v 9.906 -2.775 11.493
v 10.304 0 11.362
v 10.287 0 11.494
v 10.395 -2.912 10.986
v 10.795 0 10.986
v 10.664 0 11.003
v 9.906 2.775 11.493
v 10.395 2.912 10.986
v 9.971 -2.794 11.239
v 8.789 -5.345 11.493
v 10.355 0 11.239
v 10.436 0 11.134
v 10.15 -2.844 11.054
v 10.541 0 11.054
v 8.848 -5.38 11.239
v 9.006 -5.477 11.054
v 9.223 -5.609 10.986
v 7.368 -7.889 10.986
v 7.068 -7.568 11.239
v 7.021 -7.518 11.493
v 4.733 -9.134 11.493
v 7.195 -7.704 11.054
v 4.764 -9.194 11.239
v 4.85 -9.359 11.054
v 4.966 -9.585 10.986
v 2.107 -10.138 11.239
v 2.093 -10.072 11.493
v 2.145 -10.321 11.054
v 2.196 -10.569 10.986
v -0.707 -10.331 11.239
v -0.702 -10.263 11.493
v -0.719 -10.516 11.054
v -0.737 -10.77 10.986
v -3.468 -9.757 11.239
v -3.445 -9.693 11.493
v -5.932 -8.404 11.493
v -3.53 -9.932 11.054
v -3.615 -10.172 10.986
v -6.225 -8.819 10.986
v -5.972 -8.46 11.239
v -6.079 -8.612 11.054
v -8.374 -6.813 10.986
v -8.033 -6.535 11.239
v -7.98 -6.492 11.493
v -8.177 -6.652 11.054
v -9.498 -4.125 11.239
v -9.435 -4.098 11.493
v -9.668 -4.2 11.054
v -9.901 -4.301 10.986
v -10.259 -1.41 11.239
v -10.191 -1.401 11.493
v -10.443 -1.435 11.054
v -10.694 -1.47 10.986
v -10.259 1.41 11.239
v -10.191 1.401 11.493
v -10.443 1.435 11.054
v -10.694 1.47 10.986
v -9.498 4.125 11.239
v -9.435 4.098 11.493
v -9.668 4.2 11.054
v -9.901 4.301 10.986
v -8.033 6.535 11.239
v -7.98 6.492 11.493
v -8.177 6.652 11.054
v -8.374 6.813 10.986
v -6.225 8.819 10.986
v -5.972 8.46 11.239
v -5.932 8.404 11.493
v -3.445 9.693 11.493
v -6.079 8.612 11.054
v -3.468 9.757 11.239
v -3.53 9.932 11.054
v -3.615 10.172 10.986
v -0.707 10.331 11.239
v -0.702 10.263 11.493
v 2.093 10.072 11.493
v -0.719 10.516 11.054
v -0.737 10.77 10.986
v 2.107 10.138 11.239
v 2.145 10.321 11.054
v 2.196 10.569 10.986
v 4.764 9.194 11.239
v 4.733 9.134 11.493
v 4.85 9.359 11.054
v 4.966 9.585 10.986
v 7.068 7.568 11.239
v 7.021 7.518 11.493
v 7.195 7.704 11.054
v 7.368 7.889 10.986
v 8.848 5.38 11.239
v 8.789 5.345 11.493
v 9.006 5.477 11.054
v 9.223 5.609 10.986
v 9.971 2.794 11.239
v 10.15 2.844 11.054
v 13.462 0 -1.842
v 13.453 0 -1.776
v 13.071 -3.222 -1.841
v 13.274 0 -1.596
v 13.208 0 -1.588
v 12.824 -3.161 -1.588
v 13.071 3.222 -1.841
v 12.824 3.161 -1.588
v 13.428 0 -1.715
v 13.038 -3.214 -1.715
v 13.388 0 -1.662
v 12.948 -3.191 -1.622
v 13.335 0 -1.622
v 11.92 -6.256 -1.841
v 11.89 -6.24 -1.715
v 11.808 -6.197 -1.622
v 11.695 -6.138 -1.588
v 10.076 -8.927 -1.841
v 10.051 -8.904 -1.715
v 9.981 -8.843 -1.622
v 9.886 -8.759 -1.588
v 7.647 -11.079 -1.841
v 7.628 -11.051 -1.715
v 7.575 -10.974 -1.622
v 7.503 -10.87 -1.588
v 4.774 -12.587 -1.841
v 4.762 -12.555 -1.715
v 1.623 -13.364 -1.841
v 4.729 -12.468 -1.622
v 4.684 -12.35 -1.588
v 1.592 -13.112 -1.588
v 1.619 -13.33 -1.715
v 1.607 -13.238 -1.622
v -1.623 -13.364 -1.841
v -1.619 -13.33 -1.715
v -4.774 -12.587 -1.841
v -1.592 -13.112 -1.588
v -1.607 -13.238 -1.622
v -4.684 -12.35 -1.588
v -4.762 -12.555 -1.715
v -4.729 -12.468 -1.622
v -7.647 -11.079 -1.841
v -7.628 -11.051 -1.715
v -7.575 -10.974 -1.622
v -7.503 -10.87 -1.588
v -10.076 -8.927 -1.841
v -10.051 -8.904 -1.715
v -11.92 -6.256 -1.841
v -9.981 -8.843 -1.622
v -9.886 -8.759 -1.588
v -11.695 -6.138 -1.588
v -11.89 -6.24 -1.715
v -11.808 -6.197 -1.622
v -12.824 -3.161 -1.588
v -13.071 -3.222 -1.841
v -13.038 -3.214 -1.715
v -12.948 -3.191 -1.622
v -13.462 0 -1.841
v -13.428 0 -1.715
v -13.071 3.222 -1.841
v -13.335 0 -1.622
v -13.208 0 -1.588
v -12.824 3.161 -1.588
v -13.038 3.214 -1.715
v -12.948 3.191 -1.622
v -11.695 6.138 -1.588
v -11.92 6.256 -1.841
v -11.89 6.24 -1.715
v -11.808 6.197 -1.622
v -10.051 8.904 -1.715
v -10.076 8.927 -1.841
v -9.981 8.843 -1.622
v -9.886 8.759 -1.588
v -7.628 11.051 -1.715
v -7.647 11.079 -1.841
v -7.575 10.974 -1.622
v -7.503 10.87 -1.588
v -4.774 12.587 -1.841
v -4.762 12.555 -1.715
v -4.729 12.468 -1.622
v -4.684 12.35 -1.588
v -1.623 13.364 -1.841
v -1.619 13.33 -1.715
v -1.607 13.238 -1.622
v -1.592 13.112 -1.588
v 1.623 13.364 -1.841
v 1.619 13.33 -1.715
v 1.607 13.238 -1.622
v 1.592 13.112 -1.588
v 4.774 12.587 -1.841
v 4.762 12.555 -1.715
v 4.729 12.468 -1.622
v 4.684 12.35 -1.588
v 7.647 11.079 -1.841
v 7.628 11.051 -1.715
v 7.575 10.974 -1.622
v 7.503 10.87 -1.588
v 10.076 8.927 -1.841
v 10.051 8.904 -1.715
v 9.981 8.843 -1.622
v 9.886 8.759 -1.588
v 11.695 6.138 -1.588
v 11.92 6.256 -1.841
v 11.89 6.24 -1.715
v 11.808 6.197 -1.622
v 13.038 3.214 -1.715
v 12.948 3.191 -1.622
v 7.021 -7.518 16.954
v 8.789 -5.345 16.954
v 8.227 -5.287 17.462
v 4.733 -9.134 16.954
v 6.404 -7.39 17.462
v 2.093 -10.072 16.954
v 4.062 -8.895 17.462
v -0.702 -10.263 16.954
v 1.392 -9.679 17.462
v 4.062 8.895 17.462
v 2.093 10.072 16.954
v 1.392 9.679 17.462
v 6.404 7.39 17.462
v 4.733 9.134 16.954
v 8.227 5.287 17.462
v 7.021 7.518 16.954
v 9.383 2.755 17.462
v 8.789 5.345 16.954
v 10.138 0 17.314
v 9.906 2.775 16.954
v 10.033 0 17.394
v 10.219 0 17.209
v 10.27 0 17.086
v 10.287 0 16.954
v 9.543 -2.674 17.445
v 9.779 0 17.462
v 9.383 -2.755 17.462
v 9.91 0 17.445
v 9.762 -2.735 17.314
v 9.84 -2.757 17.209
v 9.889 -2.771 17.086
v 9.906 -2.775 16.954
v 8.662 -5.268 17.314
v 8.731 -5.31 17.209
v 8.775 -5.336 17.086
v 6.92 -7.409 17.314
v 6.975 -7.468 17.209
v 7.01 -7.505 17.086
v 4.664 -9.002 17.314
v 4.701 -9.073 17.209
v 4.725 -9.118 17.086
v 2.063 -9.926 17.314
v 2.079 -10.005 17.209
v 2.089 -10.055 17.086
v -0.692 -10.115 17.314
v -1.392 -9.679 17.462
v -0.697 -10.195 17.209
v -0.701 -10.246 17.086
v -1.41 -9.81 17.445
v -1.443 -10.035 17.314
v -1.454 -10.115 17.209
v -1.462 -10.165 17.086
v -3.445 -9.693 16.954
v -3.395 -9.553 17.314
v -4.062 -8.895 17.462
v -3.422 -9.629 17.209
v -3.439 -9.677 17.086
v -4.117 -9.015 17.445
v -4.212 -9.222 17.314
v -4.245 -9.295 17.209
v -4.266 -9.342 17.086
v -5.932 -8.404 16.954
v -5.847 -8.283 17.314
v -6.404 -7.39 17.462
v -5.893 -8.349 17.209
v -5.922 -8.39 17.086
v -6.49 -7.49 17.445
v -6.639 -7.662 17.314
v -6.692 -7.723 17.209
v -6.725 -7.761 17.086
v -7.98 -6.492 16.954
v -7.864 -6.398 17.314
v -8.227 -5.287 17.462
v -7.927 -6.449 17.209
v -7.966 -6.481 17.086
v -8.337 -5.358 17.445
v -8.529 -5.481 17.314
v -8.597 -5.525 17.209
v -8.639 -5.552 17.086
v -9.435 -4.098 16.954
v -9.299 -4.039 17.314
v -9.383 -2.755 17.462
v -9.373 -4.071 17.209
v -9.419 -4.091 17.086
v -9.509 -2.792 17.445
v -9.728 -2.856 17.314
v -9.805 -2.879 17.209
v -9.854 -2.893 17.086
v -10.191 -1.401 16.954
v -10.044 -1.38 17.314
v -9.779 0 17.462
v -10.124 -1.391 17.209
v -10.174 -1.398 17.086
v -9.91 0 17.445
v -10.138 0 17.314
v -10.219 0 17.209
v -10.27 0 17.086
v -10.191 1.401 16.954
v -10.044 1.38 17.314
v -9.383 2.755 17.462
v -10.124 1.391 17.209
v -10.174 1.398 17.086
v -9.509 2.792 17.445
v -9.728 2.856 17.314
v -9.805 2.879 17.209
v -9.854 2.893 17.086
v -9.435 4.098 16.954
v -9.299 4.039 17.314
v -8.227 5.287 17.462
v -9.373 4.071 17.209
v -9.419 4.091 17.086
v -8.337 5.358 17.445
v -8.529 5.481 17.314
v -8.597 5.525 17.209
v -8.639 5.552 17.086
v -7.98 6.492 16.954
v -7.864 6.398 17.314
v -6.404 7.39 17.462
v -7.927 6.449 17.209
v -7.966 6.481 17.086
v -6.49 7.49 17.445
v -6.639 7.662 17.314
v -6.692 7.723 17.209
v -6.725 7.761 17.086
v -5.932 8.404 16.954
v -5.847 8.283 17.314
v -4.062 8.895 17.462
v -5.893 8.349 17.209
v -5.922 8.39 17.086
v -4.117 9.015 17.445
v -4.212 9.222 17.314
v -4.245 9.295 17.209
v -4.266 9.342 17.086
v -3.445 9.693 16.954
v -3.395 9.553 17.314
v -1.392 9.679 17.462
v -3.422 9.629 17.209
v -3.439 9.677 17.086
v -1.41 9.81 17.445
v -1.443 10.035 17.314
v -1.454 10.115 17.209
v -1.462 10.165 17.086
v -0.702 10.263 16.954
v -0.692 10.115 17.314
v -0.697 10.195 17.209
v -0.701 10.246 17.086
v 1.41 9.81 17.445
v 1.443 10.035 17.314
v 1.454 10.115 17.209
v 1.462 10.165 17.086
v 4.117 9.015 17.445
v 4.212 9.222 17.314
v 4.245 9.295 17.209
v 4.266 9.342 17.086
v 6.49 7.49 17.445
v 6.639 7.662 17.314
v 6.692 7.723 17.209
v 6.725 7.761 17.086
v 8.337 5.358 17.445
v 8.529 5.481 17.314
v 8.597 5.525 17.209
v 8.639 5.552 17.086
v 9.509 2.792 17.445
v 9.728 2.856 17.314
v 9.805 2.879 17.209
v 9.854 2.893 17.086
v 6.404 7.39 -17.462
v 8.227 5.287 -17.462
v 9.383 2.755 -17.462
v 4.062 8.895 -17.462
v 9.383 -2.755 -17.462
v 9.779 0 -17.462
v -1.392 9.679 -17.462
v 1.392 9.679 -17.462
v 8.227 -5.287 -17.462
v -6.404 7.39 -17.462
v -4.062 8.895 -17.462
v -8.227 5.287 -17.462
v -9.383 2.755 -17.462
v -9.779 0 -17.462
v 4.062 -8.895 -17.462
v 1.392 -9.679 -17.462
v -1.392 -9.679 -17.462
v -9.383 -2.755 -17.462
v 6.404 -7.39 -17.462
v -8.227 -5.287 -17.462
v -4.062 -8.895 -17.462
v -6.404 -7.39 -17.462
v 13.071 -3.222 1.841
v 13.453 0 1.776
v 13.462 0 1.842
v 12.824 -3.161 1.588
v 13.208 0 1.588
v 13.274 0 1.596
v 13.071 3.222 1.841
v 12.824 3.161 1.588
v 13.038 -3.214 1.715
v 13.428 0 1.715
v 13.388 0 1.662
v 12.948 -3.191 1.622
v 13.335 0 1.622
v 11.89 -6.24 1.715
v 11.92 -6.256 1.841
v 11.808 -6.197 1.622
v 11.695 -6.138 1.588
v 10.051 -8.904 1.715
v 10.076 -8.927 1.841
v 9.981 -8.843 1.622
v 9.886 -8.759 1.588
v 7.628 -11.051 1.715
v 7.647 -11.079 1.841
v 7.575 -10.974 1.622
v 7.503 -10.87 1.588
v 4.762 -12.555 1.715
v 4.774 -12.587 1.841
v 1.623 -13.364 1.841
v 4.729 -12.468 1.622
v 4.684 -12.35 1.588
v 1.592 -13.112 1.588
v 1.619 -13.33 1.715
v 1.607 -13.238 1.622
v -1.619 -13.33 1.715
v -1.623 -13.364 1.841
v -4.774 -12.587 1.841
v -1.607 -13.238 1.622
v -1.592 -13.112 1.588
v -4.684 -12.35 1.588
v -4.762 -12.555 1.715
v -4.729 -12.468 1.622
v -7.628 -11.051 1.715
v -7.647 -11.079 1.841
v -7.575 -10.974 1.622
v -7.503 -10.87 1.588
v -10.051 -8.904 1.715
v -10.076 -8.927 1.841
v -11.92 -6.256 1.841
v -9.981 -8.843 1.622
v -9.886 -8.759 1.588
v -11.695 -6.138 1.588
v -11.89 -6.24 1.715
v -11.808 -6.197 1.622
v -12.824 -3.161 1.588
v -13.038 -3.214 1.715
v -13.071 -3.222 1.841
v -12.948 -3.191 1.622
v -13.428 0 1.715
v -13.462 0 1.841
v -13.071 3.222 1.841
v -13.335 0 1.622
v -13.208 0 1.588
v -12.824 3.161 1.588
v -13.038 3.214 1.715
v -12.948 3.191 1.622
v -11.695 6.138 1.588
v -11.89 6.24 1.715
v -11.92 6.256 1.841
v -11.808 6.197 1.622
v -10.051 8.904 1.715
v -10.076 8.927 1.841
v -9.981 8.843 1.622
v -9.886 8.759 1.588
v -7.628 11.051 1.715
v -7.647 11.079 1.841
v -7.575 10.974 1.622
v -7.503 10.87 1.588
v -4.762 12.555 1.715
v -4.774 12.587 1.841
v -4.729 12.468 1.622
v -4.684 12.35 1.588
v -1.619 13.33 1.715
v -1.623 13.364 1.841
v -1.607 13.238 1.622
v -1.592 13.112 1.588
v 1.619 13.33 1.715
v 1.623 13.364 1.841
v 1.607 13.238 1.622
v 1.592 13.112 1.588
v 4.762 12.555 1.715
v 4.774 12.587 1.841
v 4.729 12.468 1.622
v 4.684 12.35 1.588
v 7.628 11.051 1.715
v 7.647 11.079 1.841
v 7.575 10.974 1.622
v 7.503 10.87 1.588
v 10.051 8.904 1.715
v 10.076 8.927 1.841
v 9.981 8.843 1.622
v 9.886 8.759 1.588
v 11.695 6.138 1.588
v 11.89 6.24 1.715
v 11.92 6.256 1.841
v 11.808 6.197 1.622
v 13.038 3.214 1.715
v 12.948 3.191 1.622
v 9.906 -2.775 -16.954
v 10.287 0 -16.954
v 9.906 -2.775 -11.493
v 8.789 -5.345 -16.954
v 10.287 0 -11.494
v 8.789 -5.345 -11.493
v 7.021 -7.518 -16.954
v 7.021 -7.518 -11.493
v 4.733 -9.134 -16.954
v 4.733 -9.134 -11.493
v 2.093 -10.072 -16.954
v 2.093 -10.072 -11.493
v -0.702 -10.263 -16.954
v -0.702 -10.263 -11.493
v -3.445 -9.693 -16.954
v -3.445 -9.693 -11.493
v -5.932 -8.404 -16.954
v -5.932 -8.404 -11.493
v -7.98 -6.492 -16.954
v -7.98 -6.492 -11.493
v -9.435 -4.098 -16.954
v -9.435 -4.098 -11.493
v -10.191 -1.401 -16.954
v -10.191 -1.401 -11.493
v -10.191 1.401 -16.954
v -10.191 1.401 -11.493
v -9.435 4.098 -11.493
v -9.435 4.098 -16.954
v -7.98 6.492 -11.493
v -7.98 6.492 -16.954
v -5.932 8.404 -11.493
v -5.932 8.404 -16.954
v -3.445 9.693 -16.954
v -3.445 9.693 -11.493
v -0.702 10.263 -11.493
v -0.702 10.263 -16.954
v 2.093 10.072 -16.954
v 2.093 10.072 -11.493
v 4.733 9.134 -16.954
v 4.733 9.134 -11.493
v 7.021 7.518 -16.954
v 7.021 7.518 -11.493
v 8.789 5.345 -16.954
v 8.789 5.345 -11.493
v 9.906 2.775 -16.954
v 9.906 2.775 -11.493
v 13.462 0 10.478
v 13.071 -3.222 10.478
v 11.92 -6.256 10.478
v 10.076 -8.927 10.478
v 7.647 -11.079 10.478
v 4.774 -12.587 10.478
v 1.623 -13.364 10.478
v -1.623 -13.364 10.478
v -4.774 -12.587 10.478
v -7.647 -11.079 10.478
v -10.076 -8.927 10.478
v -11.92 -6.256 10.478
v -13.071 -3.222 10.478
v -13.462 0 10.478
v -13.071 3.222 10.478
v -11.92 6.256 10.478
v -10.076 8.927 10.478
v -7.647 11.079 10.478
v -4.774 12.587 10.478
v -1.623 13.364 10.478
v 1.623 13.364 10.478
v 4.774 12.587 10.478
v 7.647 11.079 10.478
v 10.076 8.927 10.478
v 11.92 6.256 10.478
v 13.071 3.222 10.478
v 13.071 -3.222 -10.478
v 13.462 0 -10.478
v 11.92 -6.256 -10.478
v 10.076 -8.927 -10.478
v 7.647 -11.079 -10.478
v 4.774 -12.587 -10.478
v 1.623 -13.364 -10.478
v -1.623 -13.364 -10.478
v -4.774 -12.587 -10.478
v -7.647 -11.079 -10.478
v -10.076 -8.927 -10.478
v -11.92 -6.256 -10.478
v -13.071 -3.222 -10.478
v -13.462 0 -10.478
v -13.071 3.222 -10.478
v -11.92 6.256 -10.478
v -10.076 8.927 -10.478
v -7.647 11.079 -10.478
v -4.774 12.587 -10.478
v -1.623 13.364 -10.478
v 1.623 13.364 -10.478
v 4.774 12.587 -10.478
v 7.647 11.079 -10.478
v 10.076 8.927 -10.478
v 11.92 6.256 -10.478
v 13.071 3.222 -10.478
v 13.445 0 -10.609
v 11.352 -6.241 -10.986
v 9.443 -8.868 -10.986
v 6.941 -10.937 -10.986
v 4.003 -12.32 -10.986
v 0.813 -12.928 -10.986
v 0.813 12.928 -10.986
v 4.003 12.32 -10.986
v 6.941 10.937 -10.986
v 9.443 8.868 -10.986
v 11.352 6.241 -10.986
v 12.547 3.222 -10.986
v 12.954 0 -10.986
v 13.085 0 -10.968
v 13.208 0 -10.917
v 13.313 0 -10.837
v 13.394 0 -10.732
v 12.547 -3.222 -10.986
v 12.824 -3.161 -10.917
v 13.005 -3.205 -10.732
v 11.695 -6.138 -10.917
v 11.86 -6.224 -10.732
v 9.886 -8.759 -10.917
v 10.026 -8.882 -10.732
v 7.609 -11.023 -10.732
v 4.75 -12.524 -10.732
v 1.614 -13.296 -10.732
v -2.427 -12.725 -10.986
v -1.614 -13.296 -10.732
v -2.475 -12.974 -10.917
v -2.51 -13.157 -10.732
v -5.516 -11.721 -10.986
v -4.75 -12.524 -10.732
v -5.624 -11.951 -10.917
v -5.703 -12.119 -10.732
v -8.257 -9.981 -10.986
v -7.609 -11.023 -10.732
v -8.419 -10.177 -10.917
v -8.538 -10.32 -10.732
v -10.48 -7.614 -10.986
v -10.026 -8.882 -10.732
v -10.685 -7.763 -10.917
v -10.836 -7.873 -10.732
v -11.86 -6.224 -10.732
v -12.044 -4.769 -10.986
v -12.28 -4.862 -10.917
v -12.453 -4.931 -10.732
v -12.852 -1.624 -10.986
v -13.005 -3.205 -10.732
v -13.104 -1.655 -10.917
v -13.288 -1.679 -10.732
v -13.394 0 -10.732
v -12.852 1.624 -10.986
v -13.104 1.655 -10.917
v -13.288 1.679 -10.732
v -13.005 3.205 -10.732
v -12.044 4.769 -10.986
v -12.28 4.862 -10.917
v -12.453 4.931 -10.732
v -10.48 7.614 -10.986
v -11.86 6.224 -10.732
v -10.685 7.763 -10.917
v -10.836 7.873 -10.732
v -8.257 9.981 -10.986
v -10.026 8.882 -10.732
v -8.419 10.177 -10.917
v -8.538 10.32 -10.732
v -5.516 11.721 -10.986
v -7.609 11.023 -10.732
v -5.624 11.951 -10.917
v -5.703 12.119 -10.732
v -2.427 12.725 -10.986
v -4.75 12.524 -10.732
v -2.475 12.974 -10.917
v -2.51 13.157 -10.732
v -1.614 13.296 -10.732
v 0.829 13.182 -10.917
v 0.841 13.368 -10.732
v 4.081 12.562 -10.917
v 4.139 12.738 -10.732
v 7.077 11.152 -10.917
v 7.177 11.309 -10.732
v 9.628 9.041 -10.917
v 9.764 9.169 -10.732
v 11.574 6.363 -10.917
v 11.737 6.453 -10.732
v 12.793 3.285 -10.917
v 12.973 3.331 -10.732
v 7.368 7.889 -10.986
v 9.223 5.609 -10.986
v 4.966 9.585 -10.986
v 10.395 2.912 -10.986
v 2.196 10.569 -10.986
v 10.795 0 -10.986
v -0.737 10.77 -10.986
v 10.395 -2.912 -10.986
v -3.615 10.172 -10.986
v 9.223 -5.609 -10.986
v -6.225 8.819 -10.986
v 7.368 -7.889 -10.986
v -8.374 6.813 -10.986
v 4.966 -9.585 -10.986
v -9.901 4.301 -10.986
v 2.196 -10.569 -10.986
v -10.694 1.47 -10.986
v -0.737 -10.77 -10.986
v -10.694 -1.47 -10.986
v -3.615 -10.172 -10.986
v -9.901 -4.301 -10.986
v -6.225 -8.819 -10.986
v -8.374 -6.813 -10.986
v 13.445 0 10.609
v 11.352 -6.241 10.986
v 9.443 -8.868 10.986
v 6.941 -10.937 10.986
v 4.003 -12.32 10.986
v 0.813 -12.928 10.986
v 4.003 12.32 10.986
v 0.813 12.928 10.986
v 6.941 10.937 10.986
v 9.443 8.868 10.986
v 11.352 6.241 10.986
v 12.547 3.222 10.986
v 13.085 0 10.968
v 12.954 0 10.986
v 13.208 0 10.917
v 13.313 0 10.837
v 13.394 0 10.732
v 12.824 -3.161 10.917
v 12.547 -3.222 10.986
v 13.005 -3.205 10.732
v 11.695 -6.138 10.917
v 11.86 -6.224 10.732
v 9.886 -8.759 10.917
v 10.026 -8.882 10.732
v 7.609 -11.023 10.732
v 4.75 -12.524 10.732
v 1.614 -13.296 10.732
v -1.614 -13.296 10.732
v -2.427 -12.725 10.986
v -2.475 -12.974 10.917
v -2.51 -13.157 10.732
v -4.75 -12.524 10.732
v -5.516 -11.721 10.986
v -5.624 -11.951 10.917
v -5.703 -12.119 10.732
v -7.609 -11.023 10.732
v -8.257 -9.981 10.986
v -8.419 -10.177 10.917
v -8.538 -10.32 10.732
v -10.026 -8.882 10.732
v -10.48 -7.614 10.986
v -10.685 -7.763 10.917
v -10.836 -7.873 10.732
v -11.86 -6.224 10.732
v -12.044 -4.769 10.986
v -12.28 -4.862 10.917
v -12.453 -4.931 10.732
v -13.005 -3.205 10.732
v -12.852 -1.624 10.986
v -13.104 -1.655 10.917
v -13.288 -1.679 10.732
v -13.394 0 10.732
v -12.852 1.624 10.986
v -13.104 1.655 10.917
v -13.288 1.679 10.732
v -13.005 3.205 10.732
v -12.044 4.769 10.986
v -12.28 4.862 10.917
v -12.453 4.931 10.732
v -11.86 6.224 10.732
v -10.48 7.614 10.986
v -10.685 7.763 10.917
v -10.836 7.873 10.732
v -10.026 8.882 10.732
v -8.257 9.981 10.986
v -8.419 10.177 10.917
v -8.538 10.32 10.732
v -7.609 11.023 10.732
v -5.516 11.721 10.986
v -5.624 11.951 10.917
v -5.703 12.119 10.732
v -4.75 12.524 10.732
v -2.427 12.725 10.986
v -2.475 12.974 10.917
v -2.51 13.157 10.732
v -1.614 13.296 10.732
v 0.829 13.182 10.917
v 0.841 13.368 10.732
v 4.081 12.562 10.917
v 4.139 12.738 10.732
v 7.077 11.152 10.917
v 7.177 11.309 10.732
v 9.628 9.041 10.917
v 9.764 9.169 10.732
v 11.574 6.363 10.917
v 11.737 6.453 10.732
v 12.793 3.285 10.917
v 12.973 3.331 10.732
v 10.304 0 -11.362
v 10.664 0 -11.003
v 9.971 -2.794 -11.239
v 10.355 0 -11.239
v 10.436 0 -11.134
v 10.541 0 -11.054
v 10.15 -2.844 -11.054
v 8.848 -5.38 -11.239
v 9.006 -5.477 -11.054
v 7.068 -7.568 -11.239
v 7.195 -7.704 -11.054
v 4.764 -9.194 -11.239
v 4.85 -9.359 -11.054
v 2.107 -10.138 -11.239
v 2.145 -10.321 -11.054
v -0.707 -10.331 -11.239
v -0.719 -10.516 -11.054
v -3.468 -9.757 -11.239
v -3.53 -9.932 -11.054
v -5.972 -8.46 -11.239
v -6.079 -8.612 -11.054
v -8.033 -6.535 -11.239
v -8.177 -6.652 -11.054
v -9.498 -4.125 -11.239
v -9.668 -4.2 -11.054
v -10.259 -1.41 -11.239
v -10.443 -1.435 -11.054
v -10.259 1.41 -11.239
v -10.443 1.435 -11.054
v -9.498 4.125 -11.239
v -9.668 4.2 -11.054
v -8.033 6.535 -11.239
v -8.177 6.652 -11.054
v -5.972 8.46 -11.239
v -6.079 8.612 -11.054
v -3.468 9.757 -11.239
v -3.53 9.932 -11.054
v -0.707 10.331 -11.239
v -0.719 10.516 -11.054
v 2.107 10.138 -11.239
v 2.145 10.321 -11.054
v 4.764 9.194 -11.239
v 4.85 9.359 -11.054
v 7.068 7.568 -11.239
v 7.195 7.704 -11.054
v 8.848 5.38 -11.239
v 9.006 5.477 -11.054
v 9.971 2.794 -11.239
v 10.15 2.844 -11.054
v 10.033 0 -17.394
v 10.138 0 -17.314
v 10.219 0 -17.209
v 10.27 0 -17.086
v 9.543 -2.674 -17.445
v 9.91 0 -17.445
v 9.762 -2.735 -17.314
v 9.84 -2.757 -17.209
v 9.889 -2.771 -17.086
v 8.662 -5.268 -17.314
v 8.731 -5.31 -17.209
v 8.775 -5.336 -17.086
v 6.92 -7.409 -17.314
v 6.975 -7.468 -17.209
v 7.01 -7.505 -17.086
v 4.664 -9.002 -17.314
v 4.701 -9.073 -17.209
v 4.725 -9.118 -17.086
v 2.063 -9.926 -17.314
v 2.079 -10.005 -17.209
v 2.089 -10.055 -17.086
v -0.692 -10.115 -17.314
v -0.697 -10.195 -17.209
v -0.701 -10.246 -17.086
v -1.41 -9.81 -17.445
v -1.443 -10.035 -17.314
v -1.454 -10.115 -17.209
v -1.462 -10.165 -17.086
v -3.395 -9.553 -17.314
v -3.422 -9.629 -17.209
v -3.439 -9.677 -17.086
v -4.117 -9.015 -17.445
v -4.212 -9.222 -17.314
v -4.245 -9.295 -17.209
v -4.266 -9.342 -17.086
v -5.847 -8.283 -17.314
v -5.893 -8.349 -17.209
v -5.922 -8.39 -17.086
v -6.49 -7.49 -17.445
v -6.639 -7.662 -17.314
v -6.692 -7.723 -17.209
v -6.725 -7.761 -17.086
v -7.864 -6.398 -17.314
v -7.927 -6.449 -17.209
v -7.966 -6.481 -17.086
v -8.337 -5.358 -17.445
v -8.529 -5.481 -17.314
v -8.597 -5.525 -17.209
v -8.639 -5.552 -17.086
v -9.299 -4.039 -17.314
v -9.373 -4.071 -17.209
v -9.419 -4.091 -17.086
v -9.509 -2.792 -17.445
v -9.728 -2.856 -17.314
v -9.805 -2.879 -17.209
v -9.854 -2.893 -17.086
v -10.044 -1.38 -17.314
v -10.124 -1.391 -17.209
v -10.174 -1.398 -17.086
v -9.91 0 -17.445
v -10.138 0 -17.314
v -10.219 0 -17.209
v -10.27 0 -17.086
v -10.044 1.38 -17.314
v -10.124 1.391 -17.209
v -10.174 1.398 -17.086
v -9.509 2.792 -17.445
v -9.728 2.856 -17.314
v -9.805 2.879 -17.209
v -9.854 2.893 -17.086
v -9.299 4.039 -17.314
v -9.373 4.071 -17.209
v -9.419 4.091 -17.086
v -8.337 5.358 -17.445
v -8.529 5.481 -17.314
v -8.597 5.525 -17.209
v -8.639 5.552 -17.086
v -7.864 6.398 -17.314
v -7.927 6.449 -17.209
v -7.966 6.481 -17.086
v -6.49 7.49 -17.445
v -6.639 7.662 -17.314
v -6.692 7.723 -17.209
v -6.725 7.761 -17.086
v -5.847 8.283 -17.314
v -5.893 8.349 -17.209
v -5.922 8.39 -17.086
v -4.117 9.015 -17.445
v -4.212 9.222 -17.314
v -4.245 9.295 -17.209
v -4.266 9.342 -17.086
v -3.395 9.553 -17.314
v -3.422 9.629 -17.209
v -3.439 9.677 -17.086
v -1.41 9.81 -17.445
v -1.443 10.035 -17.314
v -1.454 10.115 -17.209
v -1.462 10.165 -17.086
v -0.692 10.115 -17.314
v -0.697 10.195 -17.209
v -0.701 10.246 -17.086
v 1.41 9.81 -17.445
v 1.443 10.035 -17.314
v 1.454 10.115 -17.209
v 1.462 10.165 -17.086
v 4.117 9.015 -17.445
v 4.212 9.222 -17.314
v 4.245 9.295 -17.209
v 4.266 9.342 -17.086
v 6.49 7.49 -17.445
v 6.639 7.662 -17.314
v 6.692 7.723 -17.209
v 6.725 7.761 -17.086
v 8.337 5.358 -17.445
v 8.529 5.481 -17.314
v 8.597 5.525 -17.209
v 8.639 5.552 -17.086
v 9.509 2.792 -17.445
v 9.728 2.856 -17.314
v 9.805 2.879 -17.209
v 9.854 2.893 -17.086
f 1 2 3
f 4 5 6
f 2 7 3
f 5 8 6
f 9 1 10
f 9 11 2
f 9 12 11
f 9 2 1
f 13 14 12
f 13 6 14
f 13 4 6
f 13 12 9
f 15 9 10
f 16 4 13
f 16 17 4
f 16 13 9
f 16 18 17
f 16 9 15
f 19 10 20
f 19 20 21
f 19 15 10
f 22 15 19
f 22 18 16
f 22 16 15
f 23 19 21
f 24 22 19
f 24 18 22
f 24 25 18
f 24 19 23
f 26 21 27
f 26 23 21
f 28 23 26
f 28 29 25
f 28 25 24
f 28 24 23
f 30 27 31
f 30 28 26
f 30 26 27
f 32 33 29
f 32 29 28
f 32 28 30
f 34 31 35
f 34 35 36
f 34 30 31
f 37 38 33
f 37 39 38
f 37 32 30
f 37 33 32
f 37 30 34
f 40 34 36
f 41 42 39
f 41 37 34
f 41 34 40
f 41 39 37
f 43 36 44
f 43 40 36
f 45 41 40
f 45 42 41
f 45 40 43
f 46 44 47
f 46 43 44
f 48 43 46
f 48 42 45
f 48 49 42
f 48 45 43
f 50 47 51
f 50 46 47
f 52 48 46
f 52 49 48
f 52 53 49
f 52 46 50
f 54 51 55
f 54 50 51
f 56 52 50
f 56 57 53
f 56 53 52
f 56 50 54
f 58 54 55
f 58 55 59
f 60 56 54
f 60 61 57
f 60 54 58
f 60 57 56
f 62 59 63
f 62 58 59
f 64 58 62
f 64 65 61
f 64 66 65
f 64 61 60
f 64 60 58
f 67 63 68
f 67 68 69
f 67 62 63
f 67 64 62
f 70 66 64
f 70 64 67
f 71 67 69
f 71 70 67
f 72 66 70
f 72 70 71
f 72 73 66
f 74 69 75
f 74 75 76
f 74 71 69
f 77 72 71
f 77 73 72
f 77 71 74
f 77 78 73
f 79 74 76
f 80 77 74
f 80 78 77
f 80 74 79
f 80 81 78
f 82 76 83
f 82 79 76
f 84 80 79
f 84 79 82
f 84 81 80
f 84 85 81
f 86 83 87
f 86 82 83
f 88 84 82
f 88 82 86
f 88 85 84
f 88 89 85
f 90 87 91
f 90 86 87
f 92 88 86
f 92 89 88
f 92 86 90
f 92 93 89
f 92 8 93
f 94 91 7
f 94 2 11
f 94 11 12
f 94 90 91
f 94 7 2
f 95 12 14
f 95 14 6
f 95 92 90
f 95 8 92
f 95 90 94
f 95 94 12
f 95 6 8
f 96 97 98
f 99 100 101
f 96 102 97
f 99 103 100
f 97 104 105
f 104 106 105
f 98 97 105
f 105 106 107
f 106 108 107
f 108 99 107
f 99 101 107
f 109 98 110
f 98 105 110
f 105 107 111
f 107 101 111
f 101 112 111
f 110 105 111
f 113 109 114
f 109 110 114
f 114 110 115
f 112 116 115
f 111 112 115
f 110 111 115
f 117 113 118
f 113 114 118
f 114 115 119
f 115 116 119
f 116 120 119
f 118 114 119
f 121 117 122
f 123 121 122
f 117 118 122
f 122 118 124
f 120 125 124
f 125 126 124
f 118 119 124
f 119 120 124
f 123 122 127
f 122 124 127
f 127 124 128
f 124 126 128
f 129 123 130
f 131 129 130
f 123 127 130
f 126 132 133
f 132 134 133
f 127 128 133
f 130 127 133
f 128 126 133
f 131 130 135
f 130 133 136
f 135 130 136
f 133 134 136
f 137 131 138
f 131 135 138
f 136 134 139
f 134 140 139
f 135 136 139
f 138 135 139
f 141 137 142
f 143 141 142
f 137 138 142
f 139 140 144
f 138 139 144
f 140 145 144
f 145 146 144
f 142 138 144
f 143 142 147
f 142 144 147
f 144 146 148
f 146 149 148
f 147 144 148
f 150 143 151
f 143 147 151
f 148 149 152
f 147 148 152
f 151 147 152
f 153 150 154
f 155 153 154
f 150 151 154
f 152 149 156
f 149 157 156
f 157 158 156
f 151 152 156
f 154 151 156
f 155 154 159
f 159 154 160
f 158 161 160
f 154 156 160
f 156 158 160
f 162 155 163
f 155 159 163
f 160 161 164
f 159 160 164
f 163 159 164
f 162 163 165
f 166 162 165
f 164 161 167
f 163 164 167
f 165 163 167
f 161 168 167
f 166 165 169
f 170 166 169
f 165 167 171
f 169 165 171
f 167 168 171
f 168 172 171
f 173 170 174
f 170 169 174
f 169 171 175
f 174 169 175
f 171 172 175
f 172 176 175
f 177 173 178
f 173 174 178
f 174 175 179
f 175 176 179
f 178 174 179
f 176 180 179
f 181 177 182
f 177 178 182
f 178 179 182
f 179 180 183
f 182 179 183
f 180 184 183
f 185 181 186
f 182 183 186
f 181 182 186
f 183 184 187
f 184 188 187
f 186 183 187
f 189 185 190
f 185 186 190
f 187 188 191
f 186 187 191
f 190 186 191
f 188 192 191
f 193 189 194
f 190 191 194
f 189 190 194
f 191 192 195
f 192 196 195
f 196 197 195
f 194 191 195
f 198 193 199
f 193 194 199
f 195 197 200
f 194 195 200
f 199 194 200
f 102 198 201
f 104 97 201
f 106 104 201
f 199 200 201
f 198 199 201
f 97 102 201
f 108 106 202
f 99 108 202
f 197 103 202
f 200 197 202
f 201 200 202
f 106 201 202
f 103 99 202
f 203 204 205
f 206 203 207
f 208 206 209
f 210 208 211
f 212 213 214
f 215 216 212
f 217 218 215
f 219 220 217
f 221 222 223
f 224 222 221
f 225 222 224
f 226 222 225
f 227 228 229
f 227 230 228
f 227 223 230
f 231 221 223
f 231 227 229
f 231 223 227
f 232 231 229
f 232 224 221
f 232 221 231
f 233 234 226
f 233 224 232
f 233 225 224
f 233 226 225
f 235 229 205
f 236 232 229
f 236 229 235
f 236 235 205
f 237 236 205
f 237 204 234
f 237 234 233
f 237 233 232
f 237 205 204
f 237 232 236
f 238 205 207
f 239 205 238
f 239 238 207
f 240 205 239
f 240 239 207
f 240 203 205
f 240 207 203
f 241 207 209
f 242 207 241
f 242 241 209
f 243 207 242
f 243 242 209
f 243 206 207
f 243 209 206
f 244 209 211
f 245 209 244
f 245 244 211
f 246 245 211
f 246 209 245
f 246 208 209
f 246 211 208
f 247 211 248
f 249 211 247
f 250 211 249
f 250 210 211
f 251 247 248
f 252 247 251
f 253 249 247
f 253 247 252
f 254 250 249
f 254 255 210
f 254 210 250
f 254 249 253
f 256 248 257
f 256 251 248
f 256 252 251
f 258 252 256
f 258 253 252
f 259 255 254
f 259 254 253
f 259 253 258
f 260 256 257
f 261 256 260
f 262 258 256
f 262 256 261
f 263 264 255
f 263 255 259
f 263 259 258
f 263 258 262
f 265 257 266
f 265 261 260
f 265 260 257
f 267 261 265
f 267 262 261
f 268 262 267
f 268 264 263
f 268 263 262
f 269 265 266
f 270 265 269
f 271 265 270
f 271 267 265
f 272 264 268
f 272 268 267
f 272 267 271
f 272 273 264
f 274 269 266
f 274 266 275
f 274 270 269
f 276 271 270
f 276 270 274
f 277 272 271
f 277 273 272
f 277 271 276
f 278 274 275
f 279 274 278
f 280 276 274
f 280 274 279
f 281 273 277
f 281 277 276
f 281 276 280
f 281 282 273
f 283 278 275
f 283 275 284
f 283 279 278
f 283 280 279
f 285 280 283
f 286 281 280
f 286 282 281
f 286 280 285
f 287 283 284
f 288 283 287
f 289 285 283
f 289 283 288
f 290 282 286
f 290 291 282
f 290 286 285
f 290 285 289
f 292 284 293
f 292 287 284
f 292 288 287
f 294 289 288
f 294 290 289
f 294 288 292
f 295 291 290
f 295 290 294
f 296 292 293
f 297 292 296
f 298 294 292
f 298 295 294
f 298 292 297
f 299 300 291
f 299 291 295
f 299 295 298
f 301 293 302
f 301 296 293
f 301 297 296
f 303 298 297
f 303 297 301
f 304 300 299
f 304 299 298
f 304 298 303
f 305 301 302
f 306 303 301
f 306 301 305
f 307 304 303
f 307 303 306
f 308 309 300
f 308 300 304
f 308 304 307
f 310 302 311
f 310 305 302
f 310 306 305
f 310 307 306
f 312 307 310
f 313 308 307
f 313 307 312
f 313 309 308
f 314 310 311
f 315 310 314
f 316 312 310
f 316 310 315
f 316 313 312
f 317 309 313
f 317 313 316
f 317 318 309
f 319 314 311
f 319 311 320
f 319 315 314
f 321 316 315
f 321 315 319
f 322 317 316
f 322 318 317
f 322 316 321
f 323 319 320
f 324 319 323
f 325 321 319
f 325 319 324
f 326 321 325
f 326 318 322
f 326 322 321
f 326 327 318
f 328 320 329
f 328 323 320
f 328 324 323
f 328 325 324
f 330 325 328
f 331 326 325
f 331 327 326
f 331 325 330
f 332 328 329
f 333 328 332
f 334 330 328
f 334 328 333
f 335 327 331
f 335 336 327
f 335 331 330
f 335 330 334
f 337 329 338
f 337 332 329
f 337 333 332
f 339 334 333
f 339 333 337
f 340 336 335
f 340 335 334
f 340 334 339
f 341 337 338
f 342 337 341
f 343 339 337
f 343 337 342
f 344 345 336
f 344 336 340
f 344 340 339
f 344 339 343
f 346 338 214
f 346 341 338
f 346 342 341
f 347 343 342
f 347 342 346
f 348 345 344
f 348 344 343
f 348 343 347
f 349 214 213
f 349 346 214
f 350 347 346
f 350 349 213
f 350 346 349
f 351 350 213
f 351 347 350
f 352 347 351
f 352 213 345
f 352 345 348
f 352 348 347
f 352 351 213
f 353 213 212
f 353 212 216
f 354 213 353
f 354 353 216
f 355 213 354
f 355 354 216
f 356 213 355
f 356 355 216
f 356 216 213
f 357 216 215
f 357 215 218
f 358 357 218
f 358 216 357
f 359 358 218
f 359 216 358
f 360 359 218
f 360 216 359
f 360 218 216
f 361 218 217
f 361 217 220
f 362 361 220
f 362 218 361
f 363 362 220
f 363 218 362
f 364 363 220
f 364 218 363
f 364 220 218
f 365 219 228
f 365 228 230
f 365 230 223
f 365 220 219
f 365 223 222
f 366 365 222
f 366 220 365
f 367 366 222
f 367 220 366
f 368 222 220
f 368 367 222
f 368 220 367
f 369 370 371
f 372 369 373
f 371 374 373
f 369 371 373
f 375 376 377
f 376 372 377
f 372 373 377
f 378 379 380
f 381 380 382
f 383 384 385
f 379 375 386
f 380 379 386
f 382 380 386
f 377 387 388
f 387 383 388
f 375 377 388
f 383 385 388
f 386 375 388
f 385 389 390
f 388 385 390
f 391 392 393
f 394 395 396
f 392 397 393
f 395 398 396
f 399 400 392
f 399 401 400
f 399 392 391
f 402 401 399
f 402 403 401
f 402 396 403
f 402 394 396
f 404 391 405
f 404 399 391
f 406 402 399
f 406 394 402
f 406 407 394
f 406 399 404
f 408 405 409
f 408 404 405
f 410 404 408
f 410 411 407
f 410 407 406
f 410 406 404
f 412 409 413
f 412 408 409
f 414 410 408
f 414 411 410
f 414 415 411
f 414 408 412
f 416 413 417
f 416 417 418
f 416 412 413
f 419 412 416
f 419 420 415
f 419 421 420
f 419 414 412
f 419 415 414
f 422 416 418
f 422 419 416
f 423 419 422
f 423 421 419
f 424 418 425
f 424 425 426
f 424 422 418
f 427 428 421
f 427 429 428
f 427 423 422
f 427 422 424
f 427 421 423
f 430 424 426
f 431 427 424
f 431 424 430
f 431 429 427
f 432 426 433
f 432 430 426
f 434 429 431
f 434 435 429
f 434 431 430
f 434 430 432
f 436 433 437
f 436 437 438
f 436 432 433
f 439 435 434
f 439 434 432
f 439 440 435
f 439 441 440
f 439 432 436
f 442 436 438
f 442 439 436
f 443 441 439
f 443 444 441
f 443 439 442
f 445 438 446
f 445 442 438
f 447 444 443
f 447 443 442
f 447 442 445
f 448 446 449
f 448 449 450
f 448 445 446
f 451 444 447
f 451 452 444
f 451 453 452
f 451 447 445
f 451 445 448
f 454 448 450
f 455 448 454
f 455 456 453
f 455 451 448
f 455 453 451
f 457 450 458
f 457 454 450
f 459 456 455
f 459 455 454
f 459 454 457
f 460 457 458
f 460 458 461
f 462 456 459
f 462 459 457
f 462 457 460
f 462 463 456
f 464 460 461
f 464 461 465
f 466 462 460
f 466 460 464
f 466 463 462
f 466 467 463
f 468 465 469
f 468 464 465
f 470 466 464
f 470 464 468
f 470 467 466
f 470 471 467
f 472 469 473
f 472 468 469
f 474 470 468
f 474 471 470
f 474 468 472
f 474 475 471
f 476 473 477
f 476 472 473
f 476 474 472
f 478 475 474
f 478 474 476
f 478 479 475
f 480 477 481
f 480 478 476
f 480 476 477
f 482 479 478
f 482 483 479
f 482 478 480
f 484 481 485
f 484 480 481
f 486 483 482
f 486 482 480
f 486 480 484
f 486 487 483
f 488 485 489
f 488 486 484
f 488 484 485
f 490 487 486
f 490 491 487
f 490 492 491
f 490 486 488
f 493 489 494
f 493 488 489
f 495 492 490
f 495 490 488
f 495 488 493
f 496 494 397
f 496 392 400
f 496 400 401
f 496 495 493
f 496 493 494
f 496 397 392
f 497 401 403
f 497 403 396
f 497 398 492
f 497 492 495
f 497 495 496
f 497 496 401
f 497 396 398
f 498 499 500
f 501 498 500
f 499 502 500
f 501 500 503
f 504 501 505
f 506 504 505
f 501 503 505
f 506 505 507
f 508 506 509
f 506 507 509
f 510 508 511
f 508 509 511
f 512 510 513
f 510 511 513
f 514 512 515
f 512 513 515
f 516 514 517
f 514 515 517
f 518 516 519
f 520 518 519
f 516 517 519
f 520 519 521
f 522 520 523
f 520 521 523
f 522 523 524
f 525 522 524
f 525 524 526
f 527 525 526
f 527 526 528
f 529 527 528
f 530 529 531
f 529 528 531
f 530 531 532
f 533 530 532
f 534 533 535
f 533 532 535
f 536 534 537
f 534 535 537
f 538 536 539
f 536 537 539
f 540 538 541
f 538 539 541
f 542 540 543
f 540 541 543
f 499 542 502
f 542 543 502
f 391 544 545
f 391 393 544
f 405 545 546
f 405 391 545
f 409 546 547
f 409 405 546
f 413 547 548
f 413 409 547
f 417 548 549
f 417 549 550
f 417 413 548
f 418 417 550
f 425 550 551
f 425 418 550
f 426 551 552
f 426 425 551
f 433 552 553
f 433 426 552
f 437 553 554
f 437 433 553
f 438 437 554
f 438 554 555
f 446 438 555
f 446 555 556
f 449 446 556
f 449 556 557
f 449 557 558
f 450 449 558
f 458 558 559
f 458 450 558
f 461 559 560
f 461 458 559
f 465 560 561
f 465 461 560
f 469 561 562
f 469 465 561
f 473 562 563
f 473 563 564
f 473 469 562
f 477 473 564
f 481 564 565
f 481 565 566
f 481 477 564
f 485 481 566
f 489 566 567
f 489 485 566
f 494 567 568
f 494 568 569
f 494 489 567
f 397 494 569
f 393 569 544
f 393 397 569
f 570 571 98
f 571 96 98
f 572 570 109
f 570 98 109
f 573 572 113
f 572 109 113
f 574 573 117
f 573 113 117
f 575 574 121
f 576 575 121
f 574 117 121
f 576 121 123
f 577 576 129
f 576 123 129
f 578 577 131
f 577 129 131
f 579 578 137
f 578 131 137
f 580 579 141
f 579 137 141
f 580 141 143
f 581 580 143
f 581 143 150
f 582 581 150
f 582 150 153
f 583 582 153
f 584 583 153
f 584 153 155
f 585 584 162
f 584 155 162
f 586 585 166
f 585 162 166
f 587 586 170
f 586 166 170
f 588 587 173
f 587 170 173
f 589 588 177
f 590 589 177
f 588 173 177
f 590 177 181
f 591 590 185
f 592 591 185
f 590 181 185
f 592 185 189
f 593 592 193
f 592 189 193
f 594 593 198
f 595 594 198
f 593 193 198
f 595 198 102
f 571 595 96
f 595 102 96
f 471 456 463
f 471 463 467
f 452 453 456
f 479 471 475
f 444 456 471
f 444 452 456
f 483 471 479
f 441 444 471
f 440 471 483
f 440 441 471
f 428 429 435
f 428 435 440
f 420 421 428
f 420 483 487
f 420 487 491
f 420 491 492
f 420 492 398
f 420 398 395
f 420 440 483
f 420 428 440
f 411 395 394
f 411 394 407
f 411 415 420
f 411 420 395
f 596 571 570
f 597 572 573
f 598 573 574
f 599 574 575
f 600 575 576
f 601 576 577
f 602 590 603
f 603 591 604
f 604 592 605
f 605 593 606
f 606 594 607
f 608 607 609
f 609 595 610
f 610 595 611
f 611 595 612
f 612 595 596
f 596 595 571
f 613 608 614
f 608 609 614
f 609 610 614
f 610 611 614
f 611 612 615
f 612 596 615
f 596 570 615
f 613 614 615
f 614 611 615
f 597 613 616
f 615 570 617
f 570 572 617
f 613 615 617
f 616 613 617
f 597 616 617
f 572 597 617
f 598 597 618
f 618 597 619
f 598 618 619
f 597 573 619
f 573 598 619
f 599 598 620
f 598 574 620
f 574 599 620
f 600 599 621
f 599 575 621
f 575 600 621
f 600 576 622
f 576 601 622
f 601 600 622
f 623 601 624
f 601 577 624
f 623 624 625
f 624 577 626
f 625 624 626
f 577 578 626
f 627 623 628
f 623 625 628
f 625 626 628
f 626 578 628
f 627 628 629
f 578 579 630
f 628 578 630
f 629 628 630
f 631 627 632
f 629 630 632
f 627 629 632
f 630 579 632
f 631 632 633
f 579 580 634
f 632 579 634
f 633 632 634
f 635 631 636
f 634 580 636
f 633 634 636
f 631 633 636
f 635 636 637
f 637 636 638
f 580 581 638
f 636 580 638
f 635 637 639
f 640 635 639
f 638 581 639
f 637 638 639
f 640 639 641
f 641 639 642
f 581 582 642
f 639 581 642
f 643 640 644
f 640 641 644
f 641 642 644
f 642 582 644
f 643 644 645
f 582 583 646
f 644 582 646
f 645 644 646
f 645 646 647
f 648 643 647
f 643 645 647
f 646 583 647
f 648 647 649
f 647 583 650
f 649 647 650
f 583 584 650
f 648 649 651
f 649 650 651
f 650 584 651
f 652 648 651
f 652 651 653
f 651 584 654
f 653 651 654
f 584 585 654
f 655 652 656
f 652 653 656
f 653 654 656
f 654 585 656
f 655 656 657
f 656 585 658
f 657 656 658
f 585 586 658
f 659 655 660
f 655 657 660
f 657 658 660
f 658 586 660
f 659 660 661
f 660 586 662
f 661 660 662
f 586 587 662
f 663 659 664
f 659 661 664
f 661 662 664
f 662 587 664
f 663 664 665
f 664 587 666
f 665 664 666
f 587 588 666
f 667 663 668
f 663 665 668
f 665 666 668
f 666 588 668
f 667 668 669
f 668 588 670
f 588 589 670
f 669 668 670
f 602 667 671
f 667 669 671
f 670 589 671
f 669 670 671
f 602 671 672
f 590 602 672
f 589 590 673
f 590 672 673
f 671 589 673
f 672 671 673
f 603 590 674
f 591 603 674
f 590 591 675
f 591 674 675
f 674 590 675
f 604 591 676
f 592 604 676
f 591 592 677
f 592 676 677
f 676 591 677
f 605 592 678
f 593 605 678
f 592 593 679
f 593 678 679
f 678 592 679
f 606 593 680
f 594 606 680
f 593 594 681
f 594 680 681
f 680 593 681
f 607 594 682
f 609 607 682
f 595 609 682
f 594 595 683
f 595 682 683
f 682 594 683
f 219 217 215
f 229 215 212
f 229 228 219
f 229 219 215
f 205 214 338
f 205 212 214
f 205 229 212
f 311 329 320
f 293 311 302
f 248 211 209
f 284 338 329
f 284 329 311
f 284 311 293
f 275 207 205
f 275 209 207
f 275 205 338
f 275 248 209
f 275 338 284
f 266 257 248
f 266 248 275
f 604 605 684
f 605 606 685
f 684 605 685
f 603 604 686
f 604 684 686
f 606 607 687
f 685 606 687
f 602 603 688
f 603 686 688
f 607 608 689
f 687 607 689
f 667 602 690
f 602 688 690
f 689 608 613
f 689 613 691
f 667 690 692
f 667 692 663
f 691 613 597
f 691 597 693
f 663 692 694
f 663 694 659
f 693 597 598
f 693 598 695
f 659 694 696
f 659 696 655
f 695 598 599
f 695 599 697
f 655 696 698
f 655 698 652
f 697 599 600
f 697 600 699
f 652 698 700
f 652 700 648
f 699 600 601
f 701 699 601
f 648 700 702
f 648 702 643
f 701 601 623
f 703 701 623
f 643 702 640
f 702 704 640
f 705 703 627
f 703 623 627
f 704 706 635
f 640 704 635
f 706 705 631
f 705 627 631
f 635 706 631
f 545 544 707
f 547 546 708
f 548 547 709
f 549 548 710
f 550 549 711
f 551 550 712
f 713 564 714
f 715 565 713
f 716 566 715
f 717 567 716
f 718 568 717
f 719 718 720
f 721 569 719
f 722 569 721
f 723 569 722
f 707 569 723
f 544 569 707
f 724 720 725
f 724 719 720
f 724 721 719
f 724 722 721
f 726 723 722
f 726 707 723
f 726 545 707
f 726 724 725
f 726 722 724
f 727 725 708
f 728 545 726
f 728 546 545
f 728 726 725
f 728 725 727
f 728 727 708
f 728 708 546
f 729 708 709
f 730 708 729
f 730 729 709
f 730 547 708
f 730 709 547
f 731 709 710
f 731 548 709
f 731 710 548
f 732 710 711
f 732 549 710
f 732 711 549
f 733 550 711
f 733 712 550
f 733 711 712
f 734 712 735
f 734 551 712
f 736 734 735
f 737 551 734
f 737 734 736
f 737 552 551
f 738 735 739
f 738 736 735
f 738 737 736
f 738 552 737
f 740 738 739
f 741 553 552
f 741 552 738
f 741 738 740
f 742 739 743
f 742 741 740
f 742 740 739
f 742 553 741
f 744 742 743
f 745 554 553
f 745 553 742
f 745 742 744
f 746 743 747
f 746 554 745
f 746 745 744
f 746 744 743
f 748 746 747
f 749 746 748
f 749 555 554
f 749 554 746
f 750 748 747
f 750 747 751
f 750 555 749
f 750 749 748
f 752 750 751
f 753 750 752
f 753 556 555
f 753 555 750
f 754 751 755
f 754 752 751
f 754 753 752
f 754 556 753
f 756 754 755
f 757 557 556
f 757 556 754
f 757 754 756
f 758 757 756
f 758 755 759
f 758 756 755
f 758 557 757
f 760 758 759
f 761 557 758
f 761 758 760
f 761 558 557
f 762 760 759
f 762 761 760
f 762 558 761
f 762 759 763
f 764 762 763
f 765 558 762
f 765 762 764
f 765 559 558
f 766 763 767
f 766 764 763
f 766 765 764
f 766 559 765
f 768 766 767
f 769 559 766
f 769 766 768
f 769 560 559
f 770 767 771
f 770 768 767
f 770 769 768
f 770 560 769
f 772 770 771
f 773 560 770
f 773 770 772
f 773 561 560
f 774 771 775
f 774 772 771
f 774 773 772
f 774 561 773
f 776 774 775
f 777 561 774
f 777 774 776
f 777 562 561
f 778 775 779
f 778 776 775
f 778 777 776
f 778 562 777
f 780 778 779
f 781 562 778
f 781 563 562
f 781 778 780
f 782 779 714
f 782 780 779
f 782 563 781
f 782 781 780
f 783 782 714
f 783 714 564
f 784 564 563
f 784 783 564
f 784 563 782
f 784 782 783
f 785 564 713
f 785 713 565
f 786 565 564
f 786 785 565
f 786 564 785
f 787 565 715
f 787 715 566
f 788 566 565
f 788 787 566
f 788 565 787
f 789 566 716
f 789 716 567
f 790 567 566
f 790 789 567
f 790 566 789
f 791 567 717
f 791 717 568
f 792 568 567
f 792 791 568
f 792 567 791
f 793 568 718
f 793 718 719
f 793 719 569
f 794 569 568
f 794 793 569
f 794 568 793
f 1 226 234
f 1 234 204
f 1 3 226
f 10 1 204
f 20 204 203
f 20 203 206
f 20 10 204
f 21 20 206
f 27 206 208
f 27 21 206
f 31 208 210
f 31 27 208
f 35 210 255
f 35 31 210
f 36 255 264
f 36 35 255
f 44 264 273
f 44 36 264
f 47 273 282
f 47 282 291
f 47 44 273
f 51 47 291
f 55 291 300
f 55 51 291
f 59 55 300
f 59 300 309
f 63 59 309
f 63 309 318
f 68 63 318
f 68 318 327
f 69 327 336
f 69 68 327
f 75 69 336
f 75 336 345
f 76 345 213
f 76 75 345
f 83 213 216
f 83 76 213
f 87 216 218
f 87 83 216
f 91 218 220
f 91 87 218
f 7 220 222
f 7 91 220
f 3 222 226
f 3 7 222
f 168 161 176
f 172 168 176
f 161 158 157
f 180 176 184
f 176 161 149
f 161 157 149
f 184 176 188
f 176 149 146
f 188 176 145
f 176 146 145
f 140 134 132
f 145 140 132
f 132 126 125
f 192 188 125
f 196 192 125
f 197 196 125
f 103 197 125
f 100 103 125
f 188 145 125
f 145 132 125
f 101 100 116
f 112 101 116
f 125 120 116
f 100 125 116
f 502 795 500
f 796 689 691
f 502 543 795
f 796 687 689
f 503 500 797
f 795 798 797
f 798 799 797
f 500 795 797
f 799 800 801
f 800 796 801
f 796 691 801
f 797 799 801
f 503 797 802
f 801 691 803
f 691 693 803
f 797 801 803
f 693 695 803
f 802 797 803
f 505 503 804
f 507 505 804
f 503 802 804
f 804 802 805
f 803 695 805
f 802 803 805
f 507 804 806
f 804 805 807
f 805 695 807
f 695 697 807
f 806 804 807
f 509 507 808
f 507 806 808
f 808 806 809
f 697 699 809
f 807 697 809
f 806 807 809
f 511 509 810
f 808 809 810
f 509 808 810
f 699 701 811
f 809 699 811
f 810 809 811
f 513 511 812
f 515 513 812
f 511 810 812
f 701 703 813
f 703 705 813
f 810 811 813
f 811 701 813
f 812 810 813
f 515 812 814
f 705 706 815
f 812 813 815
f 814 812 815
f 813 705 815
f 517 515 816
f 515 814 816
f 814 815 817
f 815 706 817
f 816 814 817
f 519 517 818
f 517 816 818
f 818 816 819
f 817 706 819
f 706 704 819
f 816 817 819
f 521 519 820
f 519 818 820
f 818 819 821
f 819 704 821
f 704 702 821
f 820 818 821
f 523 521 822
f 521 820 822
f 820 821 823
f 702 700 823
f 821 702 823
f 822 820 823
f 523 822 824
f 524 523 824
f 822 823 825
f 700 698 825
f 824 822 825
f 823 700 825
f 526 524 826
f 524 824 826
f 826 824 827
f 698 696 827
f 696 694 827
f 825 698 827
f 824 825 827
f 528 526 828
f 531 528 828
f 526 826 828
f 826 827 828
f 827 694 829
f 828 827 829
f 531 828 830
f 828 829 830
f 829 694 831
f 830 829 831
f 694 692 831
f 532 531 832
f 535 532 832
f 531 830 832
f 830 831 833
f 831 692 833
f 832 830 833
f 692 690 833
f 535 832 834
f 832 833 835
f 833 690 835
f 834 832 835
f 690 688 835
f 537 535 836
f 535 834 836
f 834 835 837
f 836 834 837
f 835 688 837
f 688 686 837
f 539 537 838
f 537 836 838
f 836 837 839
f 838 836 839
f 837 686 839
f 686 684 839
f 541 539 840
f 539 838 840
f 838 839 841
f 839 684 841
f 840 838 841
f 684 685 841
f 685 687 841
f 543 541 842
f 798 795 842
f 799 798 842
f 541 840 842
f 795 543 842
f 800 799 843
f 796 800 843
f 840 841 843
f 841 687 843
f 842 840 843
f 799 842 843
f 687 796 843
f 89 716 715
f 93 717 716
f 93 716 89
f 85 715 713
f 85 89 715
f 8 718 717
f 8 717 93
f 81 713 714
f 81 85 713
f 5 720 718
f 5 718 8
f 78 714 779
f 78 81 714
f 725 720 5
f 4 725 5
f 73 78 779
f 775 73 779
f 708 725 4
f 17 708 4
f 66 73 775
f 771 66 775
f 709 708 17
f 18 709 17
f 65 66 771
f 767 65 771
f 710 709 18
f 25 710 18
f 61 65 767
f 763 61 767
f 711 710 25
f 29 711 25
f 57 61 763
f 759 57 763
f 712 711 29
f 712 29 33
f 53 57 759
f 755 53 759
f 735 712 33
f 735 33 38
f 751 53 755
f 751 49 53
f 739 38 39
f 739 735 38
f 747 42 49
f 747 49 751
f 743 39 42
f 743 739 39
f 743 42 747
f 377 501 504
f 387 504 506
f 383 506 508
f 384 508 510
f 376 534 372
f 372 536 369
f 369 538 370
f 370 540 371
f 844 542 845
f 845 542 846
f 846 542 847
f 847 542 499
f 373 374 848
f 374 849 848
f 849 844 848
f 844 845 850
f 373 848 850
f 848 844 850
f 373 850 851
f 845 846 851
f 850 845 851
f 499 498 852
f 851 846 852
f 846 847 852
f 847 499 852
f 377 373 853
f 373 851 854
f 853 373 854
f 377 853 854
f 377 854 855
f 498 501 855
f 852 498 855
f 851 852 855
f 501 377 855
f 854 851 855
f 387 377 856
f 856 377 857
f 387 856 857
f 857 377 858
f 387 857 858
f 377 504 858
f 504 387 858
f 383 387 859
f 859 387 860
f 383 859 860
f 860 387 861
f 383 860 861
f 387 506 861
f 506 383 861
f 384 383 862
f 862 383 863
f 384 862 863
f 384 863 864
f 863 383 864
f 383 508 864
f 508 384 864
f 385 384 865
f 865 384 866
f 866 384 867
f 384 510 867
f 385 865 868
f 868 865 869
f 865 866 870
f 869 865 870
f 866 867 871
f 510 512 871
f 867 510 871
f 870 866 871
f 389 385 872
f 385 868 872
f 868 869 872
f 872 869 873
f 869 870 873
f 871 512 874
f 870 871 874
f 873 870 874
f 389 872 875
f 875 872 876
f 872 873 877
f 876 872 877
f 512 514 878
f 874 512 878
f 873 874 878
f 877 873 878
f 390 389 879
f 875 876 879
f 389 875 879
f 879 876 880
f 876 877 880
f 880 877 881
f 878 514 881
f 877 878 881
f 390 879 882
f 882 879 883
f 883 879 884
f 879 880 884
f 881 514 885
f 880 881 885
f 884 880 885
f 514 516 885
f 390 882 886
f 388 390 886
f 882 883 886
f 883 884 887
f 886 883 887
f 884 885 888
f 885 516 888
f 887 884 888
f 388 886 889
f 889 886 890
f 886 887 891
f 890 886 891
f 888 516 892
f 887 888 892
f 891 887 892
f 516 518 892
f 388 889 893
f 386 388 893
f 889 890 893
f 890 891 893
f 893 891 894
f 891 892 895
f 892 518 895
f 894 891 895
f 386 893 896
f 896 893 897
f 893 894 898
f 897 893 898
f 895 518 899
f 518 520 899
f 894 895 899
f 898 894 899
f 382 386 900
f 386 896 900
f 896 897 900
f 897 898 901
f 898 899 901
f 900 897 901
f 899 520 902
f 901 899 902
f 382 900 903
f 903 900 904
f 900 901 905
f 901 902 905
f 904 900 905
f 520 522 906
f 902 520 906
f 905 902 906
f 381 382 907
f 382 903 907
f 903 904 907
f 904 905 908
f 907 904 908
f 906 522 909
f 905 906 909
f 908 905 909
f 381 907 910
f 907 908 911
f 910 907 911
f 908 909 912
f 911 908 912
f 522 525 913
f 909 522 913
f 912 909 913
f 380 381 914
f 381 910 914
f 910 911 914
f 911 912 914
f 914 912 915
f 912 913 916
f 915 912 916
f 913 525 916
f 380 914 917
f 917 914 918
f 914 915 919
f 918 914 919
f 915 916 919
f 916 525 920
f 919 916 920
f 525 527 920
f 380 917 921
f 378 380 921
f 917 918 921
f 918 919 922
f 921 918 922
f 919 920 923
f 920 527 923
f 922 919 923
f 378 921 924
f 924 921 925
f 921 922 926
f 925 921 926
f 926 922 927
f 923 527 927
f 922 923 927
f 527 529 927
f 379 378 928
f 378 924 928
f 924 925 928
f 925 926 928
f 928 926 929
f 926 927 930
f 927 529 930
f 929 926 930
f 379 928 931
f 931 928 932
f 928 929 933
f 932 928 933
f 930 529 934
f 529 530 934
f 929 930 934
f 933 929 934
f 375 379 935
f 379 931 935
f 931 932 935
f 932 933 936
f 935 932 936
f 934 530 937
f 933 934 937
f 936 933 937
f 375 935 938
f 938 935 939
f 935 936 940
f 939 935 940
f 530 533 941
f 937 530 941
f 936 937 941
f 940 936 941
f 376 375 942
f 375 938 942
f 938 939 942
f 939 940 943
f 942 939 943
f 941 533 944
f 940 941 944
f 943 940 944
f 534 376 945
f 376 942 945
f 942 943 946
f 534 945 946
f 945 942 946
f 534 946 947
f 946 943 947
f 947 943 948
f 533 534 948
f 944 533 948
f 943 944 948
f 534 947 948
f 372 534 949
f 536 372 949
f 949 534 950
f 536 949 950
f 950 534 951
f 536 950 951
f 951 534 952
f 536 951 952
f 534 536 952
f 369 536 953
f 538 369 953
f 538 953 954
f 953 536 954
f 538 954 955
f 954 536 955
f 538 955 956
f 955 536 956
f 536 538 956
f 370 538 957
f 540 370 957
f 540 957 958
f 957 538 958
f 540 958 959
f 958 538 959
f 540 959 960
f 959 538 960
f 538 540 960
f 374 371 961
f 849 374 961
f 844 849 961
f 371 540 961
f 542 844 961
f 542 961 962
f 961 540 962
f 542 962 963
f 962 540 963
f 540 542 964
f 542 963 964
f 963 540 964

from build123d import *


with BuildPart() as part:
    # Sketch1 → Revolve1 (revolve)
    with BuildSketch(Plane(origin=(0, 0, 0), x_dir=(0, 0, -1), z_dir=(1, 0, 0)), mode=Mode.PRIVATE) as revolve1_sk:
        with BuildLine():
            Line((-17.4625, 0), (-17.4625, 9.779))
            ThreePointArc((-17.4625, 9.779), (-17.313710245, 10.138210245), (-16.9545, 10.287))
            Line((-16.9545, 10.287), (-11.4935, 10.287))
            ThreePointArc((-11.4935, 10.287), (-11.134289755, 10.435789755), (-10.9855, 10.795))
            Line((-10.9855, 10.795), (-10.9855, 12.954))
            ThreePointArc((-10.9855, 12.954), (-10.836710245, 13.313210245), (-10.4775, 13.462))
            Line((-10.4775, 13.462), (-1.8415, 13.462))
            ThreePointArc((-1.8415, 13.462), (-1.661894878, 13.387605122), (-1.5875, 13.208))
            Line((-1.5875, 13.208), (-1.5875, 0))
            Line((-1.5875, 0), (-17.4625, 0))
        make_face()
    revolve(revolve1_sk.sketch.rotate(Axis((0, 0, 121.497728219), (0, 0, -1)), 90), axis=Axis((0, 0, 121.497728219), (0, 0, -1)))


with BuildPart() as body_2:
    # Mirror1: mirrored copy
    add(part.part.mirror(Plane.XY))


solid = Compound([part.part, body_2.part])
